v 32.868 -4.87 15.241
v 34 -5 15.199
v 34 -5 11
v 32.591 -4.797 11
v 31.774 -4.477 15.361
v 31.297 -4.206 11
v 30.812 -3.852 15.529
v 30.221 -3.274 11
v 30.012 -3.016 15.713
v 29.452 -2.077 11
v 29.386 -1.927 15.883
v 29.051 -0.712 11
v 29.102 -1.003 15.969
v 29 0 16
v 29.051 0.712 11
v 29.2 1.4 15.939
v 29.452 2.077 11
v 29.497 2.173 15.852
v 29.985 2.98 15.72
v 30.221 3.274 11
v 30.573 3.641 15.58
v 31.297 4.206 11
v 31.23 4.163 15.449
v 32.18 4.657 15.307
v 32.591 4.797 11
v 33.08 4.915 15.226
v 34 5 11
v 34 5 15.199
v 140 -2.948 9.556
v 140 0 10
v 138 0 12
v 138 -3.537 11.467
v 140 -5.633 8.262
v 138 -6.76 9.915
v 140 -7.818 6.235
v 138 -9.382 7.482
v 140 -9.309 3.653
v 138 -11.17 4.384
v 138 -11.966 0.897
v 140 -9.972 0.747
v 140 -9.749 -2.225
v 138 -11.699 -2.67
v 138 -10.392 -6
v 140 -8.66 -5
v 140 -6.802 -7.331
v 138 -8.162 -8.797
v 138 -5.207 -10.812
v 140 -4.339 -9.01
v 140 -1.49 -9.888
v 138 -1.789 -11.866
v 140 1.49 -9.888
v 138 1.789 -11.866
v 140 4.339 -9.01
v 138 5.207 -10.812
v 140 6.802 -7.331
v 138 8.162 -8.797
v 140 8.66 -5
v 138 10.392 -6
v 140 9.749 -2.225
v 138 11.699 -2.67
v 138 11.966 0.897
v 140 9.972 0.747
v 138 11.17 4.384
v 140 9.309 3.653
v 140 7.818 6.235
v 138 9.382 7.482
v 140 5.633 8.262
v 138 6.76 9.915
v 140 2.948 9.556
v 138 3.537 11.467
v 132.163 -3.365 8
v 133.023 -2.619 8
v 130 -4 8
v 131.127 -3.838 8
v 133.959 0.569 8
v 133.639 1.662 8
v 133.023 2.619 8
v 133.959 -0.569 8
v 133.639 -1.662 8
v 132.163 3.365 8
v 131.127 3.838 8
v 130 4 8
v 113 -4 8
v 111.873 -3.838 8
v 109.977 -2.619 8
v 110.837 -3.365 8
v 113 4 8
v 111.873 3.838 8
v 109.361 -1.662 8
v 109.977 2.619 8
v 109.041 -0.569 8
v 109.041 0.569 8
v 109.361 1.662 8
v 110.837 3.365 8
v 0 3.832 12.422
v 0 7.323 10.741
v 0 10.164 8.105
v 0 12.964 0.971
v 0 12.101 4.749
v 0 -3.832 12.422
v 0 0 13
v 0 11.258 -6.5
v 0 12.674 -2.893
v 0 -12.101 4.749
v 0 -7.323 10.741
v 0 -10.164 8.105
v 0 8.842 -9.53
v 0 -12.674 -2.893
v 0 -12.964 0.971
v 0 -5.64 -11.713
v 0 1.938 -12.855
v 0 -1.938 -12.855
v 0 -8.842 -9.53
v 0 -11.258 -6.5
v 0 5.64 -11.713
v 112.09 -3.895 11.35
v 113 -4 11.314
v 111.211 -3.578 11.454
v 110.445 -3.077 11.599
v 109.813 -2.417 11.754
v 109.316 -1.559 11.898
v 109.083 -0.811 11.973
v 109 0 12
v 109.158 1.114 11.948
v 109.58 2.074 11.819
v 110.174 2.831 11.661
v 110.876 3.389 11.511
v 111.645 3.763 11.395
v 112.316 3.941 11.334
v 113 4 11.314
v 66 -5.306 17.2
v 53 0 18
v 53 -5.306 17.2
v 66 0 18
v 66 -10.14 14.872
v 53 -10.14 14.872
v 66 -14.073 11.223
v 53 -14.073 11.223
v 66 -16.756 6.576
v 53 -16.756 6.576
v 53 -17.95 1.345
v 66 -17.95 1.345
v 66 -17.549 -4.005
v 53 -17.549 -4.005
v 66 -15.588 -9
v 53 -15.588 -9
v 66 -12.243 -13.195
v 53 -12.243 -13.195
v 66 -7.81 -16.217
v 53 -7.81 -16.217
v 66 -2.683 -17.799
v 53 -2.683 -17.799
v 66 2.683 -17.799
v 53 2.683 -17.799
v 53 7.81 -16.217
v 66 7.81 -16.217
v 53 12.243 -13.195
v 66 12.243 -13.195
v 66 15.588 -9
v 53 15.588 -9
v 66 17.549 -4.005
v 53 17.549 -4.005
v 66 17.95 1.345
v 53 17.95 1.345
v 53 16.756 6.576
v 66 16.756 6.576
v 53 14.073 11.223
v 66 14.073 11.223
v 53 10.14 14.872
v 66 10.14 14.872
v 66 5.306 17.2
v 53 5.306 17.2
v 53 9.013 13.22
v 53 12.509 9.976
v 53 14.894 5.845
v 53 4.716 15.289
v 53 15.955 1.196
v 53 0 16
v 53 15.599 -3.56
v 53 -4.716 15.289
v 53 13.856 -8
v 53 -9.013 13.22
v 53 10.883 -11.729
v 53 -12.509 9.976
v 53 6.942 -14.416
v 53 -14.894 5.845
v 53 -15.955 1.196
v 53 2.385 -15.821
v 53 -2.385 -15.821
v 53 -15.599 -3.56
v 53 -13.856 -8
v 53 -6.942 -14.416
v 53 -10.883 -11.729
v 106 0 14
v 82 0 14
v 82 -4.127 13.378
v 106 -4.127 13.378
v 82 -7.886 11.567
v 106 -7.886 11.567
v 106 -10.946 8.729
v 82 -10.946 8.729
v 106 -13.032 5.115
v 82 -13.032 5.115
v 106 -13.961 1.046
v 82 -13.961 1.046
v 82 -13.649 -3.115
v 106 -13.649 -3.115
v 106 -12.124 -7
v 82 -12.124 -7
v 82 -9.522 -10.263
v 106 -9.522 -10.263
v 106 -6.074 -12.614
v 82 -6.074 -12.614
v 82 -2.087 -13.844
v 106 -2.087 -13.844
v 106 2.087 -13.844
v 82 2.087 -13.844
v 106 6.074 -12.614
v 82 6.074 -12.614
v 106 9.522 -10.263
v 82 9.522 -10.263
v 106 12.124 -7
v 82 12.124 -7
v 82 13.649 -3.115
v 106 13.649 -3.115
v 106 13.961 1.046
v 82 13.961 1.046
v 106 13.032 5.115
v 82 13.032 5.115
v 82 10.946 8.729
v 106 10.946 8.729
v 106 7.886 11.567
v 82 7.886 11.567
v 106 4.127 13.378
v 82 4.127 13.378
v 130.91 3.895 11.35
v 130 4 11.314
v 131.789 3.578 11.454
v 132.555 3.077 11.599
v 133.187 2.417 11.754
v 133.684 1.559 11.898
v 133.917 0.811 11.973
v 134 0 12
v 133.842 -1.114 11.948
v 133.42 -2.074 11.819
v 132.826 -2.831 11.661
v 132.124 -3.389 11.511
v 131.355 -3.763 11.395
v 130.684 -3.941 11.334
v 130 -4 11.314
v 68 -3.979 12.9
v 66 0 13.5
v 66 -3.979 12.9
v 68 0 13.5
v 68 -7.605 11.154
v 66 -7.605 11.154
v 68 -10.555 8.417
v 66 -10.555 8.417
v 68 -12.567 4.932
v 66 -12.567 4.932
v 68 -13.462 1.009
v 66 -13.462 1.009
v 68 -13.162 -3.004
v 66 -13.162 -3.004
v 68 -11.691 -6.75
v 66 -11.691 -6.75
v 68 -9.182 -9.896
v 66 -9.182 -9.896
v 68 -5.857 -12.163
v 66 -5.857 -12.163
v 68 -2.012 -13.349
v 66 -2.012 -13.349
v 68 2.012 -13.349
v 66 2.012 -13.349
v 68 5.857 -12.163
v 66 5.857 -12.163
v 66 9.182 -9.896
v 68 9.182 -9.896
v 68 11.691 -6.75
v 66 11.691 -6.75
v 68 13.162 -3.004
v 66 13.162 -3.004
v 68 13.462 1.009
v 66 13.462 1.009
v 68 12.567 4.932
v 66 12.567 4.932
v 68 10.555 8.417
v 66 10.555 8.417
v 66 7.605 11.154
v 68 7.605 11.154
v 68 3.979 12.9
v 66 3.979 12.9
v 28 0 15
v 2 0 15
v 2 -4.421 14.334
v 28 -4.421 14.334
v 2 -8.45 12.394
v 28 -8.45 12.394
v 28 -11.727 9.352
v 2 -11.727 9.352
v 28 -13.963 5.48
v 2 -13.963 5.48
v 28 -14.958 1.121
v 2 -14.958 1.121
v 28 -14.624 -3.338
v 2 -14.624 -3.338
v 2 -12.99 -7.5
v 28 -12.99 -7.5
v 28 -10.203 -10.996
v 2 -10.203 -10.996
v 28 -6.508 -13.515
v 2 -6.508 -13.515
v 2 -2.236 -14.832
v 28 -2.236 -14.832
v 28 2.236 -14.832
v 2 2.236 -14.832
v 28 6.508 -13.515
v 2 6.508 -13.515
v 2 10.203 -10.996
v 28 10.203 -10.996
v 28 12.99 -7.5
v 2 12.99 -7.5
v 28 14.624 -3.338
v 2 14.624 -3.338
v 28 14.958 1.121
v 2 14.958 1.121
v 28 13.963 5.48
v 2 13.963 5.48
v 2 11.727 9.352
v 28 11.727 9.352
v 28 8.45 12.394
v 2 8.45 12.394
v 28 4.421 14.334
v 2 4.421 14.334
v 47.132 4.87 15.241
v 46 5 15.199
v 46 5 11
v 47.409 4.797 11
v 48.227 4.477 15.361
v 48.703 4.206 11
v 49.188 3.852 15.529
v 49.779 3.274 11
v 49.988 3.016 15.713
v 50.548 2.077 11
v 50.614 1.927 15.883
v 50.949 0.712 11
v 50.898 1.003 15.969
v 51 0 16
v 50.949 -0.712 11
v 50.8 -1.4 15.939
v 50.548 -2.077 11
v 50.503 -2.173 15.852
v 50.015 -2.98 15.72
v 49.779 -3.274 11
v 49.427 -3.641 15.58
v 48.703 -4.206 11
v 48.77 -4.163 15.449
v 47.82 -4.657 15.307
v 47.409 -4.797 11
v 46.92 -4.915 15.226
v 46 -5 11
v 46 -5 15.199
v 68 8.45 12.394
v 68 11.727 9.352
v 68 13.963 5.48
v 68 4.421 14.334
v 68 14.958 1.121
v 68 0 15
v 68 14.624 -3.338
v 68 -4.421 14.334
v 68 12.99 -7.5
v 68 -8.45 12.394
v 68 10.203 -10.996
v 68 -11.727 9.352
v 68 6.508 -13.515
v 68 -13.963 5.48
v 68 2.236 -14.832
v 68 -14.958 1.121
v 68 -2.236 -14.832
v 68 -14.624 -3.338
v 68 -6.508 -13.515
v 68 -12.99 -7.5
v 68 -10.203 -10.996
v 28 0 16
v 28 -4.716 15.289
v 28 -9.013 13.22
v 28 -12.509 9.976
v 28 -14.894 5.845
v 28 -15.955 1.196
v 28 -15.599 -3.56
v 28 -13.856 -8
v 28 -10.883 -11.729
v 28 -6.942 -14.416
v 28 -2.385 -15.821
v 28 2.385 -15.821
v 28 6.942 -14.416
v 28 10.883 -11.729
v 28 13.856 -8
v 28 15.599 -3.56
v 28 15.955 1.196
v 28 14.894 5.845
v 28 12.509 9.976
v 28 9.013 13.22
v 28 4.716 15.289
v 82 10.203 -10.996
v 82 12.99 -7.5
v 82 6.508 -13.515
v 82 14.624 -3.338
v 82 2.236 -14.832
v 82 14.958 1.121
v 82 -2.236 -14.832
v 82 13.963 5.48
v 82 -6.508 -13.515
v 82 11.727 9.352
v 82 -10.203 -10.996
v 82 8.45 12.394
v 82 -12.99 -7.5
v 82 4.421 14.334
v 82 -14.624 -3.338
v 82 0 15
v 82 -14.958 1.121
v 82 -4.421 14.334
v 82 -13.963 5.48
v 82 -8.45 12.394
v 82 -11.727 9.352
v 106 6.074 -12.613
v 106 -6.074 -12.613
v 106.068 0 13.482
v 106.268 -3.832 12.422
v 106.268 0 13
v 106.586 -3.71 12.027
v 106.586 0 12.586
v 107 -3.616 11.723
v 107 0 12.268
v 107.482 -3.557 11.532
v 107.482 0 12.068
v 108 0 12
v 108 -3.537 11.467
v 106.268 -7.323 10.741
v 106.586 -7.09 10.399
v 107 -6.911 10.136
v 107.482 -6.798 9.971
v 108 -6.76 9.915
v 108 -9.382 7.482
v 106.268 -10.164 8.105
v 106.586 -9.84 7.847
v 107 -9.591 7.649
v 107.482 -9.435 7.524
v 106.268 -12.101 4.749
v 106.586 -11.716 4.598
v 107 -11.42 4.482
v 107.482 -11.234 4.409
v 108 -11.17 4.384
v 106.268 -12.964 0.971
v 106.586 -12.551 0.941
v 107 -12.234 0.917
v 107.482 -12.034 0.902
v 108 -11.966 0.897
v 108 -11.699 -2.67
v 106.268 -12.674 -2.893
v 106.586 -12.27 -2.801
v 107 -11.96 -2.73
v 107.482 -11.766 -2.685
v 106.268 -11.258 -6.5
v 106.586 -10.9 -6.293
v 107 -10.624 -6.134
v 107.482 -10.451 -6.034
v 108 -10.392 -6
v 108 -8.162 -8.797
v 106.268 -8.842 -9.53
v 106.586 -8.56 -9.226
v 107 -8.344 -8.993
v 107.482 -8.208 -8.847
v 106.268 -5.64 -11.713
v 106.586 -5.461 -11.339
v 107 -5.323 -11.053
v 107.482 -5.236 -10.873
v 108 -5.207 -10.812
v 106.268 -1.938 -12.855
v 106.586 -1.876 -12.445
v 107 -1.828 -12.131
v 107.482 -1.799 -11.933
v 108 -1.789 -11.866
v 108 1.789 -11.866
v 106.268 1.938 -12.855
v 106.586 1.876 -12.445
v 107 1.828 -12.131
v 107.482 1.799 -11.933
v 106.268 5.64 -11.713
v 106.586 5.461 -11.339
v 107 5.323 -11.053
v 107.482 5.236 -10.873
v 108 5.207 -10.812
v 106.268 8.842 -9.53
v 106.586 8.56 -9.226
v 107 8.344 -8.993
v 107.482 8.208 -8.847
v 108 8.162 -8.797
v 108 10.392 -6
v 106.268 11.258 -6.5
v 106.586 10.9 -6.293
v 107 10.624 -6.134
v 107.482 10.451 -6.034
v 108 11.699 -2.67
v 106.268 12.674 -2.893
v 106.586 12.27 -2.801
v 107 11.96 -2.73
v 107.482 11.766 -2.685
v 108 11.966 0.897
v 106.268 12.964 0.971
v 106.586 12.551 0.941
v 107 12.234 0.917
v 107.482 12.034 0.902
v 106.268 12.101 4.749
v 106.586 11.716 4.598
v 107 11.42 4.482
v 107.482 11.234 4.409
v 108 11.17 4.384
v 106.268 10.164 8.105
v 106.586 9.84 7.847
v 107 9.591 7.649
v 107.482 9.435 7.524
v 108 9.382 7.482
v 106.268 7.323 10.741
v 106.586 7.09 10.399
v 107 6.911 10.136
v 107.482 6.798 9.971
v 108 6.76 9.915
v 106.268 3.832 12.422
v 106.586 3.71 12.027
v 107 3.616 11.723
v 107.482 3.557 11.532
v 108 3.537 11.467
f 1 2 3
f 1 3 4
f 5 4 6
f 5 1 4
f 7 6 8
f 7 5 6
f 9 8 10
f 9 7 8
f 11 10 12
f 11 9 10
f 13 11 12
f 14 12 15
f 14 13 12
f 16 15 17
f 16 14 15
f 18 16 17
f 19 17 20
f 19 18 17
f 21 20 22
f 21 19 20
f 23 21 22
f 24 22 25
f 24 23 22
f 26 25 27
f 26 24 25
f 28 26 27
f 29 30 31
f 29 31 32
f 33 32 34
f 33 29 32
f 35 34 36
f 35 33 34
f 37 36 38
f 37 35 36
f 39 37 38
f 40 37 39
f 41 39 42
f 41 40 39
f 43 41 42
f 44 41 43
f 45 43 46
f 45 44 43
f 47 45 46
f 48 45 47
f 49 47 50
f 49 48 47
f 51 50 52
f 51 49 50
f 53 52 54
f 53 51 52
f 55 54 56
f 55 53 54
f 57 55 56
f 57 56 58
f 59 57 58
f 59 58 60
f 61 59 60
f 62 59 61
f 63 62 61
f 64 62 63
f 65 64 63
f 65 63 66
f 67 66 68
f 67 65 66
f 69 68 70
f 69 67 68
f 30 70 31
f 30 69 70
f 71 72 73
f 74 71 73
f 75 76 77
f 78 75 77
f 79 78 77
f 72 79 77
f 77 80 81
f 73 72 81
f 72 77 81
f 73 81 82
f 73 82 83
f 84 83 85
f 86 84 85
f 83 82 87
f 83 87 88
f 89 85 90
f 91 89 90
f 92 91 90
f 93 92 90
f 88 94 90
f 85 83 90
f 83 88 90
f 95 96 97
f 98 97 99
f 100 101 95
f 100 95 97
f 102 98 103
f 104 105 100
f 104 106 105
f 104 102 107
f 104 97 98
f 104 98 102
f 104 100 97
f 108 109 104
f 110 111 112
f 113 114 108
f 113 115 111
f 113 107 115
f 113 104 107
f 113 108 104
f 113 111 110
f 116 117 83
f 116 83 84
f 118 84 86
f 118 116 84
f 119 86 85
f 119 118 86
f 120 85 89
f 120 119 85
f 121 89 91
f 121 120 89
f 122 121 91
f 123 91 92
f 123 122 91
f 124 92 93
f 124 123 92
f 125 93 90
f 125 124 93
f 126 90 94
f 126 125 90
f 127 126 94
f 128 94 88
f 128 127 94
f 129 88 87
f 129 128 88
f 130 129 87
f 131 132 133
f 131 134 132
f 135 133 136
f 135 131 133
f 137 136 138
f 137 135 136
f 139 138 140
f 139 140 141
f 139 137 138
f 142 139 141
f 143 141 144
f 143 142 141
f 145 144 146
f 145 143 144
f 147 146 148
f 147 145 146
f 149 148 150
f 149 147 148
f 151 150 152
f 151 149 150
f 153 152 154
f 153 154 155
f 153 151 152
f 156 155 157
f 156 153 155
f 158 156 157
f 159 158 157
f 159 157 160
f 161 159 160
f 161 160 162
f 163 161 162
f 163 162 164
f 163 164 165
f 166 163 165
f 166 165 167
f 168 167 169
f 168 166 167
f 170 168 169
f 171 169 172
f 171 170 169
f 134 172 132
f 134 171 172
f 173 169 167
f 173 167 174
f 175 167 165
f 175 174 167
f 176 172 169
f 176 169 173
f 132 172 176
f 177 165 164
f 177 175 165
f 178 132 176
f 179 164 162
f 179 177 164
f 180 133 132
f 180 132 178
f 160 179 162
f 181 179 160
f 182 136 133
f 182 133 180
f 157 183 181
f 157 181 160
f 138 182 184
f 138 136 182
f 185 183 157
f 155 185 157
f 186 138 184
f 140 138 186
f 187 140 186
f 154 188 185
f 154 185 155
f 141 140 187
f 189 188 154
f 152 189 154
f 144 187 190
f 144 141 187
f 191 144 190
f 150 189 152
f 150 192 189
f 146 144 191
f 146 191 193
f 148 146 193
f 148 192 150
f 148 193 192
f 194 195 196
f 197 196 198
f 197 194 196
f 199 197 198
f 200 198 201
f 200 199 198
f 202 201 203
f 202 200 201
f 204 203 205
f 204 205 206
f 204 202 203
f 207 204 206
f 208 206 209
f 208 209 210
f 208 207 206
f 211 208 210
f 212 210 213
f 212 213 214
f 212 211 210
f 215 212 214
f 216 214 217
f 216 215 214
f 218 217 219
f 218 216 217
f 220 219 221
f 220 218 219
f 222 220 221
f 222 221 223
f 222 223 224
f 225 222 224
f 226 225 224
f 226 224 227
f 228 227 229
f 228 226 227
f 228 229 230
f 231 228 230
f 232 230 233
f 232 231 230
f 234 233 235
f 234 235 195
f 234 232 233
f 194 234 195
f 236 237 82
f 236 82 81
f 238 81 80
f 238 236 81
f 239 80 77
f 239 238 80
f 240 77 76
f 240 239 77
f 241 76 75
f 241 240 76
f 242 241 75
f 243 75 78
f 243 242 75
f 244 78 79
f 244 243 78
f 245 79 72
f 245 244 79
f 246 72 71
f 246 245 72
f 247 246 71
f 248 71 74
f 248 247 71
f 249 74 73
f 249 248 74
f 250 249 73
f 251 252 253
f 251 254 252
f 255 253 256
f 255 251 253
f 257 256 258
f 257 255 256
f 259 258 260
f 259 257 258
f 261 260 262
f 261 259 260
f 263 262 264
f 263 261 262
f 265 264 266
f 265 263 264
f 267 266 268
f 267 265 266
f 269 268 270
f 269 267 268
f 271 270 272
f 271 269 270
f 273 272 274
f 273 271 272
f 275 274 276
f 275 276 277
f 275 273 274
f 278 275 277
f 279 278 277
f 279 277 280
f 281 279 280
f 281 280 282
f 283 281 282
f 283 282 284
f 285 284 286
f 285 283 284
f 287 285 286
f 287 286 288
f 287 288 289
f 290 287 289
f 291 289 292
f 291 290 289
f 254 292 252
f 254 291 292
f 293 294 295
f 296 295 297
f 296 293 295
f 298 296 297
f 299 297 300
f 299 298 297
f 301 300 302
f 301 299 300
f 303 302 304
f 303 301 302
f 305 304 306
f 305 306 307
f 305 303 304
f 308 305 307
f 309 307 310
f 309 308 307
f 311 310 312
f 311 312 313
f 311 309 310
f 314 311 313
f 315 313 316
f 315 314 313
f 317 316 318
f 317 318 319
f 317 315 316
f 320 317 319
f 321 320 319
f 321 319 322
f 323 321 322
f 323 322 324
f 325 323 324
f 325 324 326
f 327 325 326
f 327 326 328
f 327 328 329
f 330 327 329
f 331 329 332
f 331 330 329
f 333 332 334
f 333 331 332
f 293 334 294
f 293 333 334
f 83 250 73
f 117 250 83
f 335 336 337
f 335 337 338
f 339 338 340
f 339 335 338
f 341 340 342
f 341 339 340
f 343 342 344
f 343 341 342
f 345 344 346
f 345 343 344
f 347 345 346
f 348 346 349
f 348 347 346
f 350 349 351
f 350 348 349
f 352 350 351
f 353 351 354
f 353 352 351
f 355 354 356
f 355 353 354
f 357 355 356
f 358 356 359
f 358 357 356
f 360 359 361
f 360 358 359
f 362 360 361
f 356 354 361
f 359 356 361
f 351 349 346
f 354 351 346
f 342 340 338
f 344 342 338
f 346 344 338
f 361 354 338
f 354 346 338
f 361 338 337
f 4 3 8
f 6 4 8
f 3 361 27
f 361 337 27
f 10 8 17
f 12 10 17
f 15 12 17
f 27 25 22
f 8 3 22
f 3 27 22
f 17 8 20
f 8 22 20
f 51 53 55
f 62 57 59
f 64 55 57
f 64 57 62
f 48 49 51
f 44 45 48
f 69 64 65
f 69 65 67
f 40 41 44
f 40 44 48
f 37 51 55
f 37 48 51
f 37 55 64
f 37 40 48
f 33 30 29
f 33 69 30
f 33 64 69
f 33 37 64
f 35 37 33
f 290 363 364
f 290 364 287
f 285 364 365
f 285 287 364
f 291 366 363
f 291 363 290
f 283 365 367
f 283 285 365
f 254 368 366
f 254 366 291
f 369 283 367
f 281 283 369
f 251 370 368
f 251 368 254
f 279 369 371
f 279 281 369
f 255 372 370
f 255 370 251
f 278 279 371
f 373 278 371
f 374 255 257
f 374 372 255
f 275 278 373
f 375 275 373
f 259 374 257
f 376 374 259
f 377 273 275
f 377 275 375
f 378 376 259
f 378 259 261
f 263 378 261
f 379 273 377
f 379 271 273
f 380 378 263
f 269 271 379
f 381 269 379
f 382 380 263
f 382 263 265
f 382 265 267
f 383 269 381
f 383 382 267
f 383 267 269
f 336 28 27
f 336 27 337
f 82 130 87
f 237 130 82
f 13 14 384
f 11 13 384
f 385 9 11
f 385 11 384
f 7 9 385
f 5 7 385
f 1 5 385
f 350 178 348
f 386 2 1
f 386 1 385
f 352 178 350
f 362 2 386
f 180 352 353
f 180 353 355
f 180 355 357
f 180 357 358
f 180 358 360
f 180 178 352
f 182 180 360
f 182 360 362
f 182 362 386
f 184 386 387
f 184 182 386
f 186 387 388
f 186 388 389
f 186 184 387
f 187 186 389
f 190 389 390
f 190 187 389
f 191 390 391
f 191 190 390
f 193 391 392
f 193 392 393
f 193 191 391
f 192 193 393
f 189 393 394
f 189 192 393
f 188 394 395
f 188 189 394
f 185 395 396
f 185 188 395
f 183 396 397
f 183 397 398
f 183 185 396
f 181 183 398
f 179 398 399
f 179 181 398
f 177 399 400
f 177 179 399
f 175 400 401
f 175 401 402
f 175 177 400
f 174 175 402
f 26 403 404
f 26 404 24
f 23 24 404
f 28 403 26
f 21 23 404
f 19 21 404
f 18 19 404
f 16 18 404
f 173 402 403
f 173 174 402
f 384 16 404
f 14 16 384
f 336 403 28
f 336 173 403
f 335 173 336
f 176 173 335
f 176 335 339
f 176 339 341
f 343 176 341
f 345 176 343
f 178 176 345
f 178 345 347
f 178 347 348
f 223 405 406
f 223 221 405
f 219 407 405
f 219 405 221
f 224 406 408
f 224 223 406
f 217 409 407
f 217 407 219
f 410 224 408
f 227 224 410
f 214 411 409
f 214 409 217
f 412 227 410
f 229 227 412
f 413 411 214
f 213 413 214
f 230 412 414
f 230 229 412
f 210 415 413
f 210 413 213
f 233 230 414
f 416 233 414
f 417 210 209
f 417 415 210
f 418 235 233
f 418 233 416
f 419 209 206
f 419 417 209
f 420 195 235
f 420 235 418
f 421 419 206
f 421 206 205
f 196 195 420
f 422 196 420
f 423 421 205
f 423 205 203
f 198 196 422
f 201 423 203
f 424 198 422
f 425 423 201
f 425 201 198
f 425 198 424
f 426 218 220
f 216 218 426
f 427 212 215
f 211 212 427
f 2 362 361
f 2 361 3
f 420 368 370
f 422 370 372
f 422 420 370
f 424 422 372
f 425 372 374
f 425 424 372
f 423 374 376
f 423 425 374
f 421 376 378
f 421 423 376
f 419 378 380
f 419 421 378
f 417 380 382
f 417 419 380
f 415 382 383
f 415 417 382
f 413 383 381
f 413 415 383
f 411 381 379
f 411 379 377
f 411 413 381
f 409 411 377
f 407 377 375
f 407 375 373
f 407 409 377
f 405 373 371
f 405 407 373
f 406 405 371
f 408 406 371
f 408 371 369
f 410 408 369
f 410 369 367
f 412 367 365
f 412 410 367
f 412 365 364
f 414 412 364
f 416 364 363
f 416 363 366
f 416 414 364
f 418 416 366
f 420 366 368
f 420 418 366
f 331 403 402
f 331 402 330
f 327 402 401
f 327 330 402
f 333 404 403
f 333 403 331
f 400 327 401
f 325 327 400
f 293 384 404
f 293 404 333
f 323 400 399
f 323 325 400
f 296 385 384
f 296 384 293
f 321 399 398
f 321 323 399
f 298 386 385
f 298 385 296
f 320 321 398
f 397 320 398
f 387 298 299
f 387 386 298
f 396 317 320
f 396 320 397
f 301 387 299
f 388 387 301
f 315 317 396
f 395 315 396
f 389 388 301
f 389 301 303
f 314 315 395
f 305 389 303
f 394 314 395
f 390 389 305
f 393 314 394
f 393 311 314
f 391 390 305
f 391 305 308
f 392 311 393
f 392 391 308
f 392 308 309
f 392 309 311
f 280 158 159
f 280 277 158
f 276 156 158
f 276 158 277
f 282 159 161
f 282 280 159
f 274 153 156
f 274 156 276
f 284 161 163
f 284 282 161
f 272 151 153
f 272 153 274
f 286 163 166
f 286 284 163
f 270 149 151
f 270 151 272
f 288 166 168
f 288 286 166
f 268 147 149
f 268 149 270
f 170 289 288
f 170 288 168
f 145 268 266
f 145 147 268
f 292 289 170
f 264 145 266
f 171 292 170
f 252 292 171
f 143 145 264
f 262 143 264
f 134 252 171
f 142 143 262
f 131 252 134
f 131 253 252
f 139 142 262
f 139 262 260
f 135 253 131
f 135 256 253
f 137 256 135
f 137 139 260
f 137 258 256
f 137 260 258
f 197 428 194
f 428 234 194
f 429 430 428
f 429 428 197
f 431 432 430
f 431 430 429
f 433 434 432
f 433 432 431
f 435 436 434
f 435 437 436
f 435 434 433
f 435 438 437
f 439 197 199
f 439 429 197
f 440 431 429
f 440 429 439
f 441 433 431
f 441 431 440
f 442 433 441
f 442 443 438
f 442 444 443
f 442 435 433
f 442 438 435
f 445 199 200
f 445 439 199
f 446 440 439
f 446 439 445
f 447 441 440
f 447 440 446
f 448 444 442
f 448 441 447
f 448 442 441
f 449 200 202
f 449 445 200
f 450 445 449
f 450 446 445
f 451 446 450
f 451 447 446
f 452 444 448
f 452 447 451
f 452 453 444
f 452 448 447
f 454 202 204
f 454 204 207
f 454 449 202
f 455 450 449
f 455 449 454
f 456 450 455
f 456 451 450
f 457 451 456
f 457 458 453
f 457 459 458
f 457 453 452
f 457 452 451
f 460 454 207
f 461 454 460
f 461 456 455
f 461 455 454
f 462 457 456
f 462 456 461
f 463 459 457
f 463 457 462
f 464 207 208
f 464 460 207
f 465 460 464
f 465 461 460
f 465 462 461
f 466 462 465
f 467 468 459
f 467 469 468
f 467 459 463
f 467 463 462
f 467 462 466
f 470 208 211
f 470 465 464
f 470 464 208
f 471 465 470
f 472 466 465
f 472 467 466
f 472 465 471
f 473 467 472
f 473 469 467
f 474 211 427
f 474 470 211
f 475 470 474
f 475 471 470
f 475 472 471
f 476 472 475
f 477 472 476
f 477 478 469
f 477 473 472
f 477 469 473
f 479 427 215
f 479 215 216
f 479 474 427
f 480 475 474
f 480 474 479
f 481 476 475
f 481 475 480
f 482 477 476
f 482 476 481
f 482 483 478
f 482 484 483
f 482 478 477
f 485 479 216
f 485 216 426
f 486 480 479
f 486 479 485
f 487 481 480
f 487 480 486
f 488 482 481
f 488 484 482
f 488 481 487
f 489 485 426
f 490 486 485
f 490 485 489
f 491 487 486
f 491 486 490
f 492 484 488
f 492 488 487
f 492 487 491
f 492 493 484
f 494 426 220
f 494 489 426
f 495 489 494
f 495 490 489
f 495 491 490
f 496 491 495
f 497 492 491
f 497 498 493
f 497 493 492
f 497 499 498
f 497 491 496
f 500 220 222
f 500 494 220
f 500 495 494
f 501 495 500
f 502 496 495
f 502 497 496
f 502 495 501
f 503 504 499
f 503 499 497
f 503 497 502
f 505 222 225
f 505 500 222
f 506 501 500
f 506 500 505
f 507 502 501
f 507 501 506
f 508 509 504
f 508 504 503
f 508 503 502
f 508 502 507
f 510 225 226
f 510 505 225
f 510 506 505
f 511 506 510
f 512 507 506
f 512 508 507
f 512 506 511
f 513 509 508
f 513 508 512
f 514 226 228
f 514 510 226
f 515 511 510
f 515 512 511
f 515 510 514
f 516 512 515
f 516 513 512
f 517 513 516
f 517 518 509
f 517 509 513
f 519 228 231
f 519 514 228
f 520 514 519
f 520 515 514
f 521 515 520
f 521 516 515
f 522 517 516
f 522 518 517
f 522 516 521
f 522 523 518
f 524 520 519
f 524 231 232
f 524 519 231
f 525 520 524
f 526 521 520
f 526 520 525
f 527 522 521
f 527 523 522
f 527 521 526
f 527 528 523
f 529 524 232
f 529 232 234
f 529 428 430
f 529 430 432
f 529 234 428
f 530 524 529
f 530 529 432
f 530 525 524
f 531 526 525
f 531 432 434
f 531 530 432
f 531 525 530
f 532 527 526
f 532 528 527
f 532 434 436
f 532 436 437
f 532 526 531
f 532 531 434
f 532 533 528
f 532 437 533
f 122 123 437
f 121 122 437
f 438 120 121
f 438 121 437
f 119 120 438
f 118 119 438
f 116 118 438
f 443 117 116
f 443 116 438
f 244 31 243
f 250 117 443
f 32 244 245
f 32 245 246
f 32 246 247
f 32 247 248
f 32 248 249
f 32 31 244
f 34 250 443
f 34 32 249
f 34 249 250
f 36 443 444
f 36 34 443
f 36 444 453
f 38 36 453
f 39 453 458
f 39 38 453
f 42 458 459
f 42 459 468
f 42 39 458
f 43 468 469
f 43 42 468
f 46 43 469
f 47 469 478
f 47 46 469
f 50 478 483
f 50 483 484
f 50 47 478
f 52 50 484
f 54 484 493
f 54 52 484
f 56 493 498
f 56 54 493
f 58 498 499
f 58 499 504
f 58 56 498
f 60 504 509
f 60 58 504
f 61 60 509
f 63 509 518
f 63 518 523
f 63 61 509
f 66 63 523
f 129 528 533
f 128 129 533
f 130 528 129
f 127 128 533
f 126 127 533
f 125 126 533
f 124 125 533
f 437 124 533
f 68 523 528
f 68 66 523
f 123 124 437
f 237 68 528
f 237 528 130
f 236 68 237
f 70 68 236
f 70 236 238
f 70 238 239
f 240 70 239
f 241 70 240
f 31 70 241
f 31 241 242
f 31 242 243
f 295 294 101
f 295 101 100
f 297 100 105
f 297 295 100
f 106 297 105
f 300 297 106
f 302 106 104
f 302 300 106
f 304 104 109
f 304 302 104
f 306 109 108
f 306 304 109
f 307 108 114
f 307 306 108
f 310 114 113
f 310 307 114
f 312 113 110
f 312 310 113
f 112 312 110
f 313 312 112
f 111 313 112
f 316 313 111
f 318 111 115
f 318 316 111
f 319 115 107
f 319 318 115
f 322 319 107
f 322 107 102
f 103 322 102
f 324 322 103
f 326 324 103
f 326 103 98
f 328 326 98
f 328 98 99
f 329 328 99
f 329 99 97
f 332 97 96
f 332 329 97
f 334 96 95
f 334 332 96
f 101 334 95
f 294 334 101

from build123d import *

# Parameters (mm, degrees)
CUT_EXTRUDE_1_DEPTH = 12
CUT_EXTRUDE_2_DEPTH = 9
CHAMFER_1_SIZE      = 2
FILLET_1_R          = 2


with BuildPart() as part:
    # 草图1 → 旋转1 (revolve)
    with BuildSketch(Plane.XY, mode=Mode.PRIVATE) as revolve_1_sk:
        Polygon((0, 0), (0, 15), (28, 15), (28, 16), (53, 16), (53, 18), (66, 18), (66, 13.5), (68, 13.5), (68, 15), (82, 15), (82, 14), (106, 14), (106, 12), (140, 12), (140, 0), align=None)
    revolve(revolve_1_sk.sketch.rotate(Axis((0, 0, 0), (1, 0, 0)), 90), axis=Axis((0, 0, 0), (1, 0, 0)))

    # 草图2 → 切除-拉伸1 (cut)
    with BuildSketch(Plane.XY.offset(20)):
        with BuildLine():
            Line((113, 4), (130, 4))
            ThreePointArc((130, 4), (134, 0), (130, -4))
            Line((130, -4), (113, -4))
            ThreePointArc((113, -4), (109, 0), (113, 4))
        make_face()
    extrude(amount=-CUT_EXTRUDE_1_DEPTH, mode=Mode.SUBTRACT)

    # 草图3 → 切除-拉伸2 (cut)
    with BuildSketch(Plane.XY.offset(20)):
        with BuildLine():
            Line((34, 5), (46, 5))
            ThreePointArc((46, 5), (51, 0), (46, -5))
            Line((46, -5), (34, -5))
            ThreePointArc((34, -5), (29, 0), (34, 5))
        make_face()
    extrude(amount=-CUT_EXTRUDE_2_DEPTH, mode=Mode.SUBTRACT)

    # 倒角1
    chamfer_1_edges = [part.edges().sort_by_distance(p)[0] for p in [
        (140, 0, -12),
        (0, 0, -15),
    ]]
    chamfer(chamfer_1_edges, length=CHAMFER_1_SIZE)

    # 圆角1
    fillet_1_edges = [part.edges().sort_by_distance(p)[0] for p in [
        (106, 0, -12),
    ]]
    fillet(fillet_1_edges, radius=FILLET_1_R - 0.0001)  # a hair under: the kernel refuses the full size


solid = part.part
